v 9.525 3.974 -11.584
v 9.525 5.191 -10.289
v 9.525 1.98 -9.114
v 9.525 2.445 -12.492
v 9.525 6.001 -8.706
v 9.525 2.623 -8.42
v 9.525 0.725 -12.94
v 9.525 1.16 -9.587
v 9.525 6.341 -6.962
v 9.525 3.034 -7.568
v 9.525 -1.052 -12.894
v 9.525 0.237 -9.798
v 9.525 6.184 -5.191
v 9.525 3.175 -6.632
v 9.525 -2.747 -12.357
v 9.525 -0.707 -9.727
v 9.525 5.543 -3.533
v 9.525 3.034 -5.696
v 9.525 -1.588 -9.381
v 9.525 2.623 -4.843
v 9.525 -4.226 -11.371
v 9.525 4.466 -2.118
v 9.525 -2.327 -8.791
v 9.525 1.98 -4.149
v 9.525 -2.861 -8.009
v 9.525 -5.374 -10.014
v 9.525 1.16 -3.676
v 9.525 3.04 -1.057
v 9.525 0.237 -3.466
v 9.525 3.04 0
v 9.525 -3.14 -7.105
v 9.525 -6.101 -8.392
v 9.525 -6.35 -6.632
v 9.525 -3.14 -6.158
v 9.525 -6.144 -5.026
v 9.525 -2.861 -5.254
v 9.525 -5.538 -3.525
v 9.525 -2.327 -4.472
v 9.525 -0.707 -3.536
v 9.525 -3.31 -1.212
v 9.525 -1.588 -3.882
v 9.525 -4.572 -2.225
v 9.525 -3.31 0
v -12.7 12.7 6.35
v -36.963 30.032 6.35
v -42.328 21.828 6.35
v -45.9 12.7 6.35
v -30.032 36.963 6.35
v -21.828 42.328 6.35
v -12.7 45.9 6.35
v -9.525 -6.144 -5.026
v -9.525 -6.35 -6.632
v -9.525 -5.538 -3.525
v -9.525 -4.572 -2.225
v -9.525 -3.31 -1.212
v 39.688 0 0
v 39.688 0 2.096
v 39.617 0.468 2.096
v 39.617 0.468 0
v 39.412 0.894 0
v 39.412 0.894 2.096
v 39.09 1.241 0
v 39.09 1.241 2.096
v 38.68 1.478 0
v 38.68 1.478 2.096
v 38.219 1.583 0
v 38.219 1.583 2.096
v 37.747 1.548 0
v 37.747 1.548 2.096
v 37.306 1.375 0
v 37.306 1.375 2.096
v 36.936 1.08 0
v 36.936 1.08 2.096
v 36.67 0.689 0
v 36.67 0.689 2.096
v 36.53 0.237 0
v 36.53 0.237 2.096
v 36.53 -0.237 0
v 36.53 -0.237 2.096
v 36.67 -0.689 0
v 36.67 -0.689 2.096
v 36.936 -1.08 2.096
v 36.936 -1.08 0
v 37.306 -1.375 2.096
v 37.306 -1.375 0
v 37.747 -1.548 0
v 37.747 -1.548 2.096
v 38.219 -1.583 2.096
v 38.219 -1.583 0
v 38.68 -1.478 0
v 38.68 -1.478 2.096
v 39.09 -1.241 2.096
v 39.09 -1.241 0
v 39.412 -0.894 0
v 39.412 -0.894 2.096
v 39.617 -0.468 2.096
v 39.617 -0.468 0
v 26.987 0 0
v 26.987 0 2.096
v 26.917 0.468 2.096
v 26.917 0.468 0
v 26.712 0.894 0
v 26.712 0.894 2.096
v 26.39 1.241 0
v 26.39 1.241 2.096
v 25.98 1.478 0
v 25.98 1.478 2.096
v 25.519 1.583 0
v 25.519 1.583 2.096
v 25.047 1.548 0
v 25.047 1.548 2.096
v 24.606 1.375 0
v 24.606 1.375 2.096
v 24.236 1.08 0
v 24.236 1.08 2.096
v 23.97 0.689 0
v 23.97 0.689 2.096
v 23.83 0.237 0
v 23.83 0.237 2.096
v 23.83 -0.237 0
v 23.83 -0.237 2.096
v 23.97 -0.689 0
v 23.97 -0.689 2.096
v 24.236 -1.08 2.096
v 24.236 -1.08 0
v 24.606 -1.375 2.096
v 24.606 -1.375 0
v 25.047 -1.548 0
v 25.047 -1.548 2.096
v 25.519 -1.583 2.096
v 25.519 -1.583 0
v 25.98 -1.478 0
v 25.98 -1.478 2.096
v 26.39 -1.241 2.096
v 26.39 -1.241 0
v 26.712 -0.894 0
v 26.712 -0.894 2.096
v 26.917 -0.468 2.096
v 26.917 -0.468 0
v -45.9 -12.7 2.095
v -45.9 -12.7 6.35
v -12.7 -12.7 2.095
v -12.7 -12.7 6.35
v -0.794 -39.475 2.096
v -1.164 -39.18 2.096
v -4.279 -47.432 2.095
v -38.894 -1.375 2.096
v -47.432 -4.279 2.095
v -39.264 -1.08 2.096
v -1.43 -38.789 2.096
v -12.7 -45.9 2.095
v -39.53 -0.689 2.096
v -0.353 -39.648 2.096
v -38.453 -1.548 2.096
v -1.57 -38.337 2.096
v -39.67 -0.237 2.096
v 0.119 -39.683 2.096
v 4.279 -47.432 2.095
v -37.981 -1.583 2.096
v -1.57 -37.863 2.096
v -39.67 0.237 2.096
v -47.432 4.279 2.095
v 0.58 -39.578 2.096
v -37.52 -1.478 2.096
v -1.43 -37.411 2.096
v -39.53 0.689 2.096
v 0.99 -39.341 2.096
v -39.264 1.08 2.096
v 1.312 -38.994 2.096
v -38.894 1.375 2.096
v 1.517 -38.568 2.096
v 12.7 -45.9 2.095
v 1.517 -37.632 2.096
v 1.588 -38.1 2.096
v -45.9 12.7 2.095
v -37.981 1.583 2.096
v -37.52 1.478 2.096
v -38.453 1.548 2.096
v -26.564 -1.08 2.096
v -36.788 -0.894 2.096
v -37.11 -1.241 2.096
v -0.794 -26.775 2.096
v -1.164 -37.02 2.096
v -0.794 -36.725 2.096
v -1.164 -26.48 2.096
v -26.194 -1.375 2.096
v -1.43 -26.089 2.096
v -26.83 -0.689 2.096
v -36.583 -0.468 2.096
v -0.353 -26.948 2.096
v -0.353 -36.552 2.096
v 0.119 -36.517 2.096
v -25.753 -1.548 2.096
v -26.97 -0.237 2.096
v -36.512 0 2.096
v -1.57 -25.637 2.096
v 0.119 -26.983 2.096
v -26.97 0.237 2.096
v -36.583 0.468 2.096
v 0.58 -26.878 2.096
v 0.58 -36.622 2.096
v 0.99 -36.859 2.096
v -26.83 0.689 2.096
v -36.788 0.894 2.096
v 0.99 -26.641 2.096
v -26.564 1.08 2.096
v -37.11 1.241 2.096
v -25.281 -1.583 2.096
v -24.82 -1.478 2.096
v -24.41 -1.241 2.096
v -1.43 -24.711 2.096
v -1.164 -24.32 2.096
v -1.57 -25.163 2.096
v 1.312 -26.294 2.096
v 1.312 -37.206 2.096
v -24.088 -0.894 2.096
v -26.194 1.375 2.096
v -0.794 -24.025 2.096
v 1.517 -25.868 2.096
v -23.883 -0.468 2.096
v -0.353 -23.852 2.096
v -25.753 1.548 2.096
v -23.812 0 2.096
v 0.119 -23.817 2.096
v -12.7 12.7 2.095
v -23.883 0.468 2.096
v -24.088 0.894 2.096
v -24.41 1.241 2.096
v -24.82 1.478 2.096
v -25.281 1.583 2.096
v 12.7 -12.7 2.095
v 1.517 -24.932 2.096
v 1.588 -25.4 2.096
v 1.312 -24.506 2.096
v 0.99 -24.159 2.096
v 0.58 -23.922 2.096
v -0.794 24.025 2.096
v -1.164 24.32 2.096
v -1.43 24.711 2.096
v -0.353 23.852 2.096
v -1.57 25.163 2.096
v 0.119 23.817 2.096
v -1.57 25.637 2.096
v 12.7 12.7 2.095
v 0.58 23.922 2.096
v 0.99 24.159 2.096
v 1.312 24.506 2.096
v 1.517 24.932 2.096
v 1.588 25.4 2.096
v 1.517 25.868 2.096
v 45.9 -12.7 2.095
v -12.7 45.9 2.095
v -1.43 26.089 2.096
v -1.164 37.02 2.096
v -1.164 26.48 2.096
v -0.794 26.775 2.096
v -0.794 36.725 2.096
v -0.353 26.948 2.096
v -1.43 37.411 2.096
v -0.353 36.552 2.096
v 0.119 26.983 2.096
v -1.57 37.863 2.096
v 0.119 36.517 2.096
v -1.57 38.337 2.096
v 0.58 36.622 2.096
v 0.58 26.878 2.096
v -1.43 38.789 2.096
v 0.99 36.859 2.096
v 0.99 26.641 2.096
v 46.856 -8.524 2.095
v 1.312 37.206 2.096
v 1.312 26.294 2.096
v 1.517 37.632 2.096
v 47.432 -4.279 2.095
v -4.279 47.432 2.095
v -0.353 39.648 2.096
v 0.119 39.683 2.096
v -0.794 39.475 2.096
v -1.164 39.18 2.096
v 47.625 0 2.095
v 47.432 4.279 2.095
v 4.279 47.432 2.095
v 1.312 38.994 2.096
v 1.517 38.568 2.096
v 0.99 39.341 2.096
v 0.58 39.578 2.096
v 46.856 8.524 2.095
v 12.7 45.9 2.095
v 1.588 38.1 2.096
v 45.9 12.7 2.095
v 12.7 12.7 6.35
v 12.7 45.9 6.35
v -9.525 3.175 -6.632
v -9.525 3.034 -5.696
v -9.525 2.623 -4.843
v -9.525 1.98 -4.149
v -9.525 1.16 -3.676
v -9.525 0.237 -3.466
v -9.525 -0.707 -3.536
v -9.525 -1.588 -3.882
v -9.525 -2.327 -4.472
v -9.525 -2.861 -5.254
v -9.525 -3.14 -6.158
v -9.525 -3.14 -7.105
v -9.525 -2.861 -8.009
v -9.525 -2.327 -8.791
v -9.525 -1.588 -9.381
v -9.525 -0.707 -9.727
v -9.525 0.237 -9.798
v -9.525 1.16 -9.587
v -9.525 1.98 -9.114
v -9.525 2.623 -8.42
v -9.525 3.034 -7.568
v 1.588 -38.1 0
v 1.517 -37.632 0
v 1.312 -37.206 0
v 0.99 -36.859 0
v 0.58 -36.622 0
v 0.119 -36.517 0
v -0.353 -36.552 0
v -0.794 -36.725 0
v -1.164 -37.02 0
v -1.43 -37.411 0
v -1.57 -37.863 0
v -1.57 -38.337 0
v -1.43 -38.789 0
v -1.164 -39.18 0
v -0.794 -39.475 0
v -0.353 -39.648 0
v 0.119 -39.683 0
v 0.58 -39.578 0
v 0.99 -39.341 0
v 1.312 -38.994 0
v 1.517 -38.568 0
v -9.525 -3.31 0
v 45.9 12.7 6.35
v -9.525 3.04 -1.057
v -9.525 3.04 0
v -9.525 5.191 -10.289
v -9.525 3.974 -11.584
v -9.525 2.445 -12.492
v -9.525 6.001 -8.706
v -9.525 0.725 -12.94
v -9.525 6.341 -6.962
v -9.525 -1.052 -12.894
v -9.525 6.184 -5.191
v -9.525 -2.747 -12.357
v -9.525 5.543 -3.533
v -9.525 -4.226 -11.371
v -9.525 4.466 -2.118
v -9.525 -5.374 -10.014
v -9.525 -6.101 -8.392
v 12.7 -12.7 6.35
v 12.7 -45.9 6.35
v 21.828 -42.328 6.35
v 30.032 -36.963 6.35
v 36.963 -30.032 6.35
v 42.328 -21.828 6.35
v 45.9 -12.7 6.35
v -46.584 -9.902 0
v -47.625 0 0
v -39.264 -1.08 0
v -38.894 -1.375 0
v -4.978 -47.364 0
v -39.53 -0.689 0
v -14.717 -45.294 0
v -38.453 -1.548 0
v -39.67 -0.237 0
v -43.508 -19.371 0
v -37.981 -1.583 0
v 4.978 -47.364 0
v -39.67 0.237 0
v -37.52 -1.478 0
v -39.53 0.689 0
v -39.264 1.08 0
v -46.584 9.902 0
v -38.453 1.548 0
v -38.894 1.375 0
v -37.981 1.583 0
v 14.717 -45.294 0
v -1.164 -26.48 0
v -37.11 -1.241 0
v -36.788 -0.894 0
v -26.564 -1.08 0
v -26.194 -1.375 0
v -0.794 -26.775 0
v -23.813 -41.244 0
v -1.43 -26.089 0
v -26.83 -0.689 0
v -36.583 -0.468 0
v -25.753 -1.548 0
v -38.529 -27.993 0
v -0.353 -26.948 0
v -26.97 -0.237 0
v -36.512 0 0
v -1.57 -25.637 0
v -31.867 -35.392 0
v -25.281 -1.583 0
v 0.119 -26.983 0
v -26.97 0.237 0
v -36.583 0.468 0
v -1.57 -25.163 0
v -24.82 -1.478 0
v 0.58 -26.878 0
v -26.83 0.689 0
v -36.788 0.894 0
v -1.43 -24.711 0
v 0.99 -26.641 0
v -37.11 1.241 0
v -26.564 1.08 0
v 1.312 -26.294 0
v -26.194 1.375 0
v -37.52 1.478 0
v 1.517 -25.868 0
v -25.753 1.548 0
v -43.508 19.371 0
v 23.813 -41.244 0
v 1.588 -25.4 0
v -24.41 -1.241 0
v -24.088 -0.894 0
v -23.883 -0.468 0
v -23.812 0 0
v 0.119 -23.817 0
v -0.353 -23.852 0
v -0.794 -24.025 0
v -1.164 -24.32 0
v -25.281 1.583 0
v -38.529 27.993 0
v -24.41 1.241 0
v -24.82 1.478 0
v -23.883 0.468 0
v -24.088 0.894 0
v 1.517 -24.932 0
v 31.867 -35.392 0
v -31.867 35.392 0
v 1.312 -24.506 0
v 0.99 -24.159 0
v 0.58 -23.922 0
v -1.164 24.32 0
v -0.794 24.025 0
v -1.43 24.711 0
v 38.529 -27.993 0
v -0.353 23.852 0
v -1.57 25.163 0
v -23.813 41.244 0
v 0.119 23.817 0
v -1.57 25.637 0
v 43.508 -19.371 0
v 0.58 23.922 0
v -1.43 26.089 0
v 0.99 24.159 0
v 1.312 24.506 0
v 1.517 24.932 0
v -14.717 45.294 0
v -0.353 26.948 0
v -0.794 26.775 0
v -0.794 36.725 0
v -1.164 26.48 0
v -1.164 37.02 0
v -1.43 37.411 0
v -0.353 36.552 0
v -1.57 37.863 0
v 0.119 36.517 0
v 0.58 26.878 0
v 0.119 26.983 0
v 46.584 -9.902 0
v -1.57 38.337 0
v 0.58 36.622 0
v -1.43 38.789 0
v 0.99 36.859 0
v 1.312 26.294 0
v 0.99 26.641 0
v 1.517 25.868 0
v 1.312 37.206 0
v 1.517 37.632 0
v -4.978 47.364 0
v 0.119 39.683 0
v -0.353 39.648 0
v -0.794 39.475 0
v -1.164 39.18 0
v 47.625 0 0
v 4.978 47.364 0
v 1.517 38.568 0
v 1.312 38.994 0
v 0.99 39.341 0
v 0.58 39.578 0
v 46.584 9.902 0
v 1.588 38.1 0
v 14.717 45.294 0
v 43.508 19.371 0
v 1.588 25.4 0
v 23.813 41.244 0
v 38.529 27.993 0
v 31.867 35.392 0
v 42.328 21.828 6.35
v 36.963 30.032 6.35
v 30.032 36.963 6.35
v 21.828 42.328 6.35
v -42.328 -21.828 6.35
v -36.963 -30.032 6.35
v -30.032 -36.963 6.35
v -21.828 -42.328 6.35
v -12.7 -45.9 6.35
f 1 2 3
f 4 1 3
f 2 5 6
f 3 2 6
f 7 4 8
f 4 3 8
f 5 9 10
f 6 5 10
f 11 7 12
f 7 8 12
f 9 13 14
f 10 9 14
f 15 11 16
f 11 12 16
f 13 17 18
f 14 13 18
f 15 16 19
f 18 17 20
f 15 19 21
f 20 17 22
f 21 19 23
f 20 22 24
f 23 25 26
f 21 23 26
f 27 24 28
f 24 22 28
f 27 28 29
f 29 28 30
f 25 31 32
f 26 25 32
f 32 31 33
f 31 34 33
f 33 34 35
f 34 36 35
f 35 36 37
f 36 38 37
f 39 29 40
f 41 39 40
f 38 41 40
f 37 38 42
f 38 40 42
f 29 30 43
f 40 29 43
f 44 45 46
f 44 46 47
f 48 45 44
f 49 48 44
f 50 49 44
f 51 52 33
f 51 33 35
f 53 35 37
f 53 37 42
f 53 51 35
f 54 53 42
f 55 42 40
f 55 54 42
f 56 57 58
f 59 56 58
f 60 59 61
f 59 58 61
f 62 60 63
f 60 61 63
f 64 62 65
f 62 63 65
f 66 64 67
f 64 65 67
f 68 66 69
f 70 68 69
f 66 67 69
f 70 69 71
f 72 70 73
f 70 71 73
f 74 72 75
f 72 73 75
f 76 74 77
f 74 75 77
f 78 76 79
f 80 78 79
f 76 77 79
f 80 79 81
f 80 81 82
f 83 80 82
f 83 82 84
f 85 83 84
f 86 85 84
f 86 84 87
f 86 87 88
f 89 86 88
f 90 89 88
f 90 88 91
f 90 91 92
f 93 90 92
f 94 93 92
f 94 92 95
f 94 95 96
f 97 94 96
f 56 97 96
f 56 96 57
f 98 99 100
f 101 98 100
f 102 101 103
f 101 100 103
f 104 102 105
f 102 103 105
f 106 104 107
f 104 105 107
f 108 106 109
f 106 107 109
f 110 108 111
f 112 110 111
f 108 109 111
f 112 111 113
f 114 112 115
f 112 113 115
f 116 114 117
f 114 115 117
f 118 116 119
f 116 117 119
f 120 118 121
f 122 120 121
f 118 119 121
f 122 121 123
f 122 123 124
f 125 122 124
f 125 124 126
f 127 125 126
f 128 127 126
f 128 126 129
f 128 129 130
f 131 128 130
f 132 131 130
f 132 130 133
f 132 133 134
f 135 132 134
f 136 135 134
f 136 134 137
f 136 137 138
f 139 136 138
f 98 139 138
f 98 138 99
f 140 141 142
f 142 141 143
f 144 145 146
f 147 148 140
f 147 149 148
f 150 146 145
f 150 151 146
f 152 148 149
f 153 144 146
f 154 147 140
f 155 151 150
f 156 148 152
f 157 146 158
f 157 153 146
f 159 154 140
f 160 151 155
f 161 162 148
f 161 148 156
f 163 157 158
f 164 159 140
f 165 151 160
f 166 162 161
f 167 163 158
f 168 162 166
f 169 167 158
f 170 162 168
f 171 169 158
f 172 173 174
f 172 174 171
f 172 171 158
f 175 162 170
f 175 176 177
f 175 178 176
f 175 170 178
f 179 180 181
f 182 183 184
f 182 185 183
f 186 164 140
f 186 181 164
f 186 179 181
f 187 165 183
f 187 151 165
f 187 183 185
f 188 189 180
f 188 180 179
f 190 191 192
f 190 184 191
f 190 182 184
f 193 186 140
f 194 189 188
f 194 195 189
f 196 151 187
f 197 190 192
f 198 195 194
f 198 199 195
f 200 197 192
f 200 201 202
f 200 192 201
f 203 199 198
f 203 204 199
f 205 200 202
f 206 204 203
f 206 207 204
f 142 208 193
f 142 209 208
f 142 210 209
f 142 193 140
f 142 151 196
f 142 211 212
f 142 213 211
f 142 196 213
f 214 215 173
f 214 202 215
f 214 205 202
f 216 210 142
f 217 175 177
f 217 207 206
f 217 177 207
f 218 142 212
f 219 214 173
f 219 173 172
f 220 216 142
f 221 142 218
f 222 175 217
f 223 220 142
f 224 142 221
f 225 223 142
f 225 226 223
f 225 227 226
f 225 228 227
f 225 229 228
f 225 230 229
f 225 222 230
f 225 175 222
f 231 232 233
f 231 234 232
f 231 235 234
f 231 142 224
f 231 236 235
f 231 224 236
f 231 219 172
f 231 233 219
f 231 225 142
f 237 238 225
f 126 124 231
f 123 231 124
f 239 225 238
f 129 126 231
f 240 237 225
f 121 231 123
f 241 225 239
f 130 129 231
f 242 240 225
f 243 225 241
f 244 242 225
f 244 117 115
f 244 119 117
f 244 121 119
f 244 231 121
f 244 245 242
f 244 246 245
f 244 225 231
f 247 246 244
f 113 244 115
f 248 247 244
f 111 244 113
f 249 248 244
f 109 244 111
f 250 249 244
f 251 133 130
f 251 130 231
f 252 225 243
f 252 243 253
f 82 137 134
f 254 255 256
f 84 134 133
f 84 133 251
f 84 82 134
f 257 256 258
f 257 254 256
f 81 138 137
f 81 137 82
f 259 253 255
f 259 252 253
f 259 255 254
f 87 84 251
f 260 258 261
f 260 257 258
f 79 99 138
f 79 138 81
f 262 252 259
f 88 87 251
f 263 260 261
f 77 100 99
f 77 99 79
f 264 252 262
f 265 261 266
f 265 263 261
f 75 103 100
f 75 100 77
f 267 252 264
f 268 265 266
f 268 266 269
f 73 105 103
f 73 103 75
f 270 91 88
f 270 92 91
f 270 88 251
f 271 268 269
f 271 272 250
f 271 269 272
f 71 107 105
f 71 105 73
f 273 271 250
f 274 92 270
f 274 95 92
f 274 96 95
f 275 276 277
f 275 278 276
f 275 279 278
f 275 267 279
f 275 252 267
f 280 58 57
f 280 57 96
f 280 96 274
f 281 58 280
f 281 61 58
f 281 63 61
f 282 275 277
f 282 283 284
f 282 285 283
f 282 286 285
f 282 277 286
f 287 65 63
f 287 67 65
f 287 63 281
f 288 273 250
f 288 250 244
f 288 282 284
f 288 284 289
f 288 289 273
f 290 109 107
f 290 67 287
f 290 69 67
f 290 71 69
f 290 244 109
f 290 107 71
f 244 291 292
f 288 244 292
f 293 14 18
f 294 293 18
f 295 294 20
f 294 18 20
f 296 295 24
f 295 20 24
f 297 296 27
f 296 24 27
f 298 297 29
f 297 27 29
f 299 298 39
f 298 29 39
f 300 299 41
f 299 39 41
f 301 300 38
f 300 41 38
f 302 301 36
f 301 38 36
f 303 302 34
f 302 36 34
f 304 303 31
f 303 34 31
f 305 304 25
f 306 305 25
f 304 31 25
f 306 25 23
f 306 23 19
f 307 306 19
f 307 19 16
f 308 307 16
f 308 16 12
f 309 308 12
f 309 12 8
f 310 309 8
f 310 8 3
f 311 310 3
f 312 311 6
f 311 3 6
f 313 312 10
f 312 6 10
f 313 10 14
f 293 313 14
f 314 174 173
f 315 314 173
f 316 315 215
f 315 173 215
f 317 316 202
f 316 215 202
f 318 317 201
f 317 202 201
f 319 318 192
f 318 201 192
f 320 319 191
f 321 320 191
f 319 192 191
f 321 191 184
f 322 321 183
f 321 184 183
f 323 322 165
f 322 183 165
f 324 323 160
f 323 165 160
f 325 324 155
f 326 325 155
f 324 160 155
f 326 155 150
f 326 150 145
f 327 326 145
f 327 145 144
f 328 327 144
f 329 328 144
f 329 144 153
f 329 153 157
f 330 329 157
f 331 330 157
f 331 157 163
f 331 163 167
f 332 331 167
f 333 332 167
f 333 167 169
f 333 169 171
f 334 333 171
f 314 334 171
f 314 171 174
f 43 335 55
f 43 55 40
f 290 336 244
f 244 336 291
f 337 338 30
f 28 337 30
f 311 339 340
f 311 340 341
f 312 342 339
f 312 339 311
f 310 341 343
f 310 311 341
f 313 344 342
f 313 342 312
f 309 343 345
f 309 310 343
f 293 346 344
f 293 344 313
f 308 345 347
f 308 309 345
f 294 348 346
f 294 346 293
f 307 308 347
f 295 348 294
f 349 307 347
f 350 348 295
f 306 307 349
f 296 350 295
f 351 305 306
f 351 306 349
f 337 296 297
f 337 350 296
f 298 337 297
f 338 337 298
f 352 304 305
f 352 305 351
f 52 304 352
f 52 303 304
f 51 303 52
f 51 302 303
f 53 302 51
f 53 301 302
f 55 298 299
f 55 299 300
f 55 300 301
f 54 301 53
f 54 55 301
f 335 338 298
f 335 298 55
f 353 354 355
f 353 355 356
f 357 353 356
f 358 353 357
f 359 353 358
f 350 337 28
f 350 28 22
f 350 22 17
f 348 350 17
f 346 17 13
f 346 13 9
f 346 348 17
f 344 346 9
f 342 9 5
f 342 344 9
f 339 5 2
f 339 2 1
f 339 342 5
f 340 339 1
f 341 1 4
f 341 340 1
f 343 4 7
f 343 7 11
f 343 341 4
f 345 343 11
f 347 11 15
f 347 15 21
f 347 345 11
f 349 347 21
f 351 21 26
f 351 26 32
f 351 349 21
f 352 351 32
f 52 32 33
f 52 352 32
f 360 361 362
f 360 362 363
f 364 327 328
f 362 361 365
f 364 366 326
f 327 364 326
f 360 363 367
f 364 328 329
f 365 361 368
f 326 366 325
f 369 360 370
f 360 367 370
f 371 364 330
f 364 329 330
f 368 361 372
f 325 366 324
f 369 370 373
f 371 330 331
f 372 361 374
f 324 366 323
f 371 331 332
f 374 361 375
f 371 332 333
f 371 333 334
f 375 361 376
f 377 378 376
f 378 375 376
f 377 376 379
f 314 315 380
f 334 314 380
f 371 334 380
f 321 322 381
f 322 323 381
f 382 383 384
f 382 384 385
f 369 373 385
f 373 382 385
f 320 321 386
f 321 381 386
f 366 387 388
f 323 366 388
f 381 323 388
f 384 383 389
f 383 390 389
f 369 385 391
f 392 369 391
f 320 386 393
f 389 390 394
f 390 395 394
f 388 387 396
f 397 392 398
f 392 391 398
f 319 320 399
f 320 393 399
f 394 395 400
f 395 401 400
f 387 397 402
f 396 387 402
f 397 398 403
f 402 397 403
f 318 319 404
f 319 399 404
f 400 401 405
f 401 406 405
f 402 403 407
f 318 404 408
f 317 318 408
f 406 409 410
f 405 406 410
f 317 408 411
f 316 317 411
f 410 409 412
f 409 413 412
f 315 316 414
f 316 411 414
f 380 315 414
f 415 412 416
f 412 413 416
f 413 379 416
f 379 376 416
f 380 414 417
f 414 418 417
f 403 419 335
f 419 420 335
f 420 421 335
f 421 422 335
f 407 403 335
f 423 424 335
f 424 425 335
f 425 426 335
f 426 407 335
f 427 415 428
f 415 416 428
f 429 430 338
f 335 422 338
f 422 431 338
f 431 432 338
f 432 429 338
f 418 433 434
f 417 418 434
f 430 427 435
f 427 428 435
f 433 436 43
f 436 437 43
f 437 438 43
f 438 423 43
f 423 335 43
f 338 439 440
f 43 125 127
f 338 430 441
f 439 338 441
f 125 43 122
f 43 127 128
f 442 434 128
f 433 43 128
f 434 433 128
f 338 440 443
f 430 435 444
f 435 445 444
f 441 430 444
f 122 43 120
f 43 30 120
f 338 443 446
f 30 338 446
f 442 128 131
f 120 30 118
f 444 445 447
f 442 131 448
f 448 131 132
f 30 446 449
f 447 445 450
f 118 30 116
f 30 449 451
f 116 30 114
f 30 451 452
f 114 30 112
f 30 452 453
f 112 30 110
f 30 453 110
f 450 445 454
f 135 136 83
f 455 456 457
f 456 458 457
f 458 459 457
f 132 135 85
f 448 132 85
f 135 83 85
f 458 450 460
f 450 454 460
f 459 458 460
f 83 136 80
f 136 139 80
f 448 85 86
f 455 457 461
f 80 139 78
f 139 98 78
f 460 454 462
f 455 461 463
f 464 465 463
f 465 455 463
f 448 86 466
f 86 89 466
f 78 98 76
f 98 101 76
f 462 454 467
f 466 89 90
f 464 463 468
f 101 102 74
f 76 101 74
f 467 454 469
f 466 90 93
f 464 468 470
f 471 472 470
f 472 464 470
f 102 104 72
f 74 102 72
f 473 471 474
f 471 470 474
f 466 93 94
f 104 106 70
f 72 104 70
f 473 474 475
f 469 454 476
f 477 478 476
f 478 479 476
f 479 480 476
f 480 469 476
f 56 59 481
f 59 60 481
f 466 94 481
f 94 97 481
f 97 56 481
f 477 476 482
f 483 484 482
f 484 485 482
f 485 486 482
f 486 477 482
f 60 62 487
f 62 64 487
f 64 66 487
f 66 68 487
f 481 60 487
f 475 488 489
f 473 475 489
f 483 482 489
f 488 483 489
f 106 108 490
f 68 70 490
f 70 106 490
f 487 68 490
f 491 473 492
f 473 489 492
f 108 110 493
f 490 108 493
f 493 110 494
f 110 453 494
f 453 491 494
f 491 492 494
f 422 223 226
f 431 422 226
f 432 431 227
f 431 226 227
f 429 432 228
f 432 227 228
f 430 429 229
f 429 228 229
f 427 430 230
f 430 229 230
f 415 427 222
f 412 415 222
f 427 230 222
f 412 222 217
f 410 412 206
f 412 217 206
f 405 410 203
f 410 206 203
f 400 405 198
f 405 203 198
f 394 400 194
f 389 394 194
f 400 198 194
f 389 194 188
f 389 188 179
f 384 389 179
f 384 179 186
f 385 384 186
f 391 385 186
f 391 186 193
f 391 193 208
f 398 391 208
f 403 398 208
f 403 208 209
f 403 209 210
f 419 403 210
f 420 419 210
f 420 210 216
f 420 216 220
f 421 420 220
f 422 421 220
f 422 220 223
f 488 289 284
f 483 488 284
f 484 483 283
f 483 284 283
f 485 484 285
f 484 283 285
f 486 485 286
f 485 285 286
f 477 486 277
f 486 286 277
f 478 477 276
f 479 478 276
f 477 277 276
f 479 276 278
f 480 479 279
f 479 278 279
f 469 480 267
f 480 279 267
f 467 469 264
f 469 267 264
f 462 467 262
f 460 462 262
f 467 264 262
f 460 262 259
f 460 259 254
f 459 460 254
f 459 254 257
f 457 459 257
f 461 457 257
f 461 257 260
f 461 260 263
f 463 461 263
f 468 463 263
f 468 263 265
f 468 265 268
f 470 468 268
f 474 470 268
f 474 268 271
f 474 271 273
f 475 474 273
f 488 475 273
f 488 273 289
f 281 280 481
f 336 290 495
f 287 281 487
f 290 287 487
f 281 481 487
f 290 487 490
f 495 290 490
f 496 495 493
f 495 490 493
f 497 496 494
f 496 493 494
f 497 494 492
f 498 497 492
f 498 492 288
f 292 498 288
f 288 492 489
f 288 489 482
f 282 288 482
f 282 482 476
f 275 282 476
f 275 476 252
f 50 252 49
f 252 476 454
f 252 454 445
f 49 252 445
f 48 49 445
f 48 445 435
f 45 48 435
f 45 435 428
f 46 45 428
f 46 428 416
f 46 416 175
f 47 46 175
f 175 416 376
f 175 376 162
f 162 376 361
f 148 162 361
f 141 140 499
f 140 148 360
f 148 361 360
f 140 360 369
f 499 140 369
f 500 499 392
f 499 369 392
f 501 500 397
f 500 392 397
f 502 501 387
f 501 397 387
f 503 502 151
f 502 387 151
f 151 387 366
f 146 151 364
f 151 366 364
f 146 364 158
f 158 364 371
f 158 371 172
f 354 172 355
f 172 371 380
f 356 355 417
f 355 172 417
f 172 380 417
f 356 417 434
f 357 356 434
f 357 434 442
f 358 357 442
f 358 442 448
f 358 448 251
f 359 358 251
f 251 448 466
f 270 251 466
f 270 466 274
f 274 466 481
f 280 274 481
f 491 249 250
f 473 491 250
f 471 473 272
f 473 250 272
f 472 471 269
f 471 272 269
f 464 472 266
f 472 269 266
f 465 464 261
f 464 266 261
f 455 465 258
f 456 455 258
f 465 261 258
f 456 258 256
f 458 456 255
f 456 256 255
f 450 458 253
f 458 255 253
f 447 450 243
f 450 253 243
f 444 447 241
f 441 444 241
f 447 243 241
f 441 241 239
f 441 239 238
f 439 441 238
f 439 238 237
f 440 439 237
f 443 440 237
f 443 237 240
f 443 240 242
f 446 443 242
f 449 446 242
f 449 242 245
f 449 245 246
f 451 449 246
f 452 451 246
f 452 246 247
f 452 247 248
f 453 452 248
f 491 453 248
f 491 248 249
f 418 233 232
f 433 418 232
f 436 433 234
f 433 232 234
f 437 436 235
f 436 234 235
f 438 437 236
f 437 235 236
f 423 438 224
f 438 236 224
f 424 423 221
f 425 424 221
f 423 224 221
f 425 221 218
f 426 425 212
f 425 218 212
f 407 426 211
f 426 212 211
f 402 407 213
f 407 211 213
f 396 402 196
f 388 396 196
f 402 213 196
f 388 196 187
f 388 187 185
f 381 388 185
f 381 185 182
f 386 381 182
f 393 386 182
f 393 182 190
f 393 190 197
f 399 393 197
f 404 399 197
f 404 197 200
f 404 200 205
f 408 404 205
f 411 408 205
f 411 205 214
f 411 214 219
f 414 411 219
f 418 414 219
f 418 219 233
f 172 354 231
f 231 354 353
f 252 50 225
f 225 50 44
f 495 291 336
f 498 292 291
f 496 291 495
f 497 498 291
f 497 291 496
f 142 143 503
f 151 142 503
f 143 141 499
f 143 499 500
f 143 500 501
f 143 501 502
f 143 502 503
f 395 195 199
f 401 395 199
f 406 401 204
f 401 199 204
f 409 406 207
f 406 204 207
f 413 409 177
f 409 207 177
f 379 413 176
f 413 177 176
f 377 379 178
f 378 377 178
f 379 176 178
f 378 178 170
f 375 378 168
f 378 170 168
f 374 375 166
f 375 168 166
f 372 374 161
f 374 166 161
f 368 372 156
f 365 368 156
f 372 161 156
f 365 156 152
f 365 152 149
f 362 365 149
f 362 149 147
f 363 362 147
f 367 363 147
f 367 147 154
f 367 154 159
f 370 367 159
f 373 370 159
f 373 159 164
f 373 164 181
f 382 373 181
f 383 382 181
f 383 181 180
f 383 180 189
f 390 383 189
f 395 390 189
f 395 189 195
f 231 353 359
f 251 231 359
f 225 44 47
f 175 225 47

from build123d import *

# Parameters (mm, degrees)
F0_R      = 47.625
F1_DEPTH  = 6.35
F3_DEPTH  = 4.2545
F5_W      = 19.05
F5_H      = 6.35
F6_DEPTH  = 6.35
F8_DEPTH  = 19.05
F9_R      = 3.175
F10_DEPTH = 19.05
F4_R      = 1.5875
F11_DEPTH = 25.4


with BuildPart() as f1:
    # F0 (on Top) → F1 (new body)
    with BuildSketch(Plane.XY):
        Circle(F0_R)
    extrude(amount=F1_DEPTH)

    # F2 (on face) → F3 (cut)
    with BuildSketch(Plane.XY.offset(6.35)):
        with BuildLine():
            ThreePointArc((12.7, 45.900442536), (0, 47.625), (-12.7, 45.900442536))
            Line((-12.7, 45.900442536), (-12.7, 12.7))
            Line((-12.7, 12.7), (-45.900442536, 12.7))
            ThreePointArc((-45.900442536, 12.7), (-47.625, 0), (-45.900442536, -12.7))
            Line((-45.900442536, -12.7), (-12.7, -12.7))
            Line((-12.7, -12.7), (-12.7, -45.900442536))
            ThreePointArc((-12.7, -45.900442536), (0, -47.625), (12.7, -45.900442536))
            Line((12.7, -45.900442536), (12.7, -12.7))
            Line((12.7, -12.7), (45.900442536, -12.7))
            ThreePointArc((45.900442536, -12.7), (47.1918912567, -6.4082778195), (47.625, 0))
            ThreePointArc((47.625, 0), (47.1918912567, 6.4082778195), (45.900442536, 12.7))
            Line((45.900442536, 12.7), (12.7, 12.7))
            Line((12.7, 12.7), (12.7, 45.900442536))
        make_face()
    extrude(amount=-F3_DEPTH, mode=Mode.SUBTRACT)

    # F5 (on face) → F6 (join)
    with BuildSketch(Plane(origin=(0, 0, 0), x_dir=(1, 0, 0), z_dir=(0, 0, -1))):
        with Locations((0, 0.1347091747)):
            Rectangle(F5_W, F5_H)
    extrude(amount=F6_DEPTH)

    # F7 (on face) → F8 (join)
    with BuildSketch(Plane(origin=(-9.525, 0, 0), x_dir=(0, -1, 0), z_dir=(-1, 0, 0))):
        with BuildLine():
            ThreePointArc((-3.0402908253, -1.0568323894), (-3.2416549215, -12.0919341109), (6.35, -6.6316984594))
            ThreePointArc((6.35, -6.6316984594), (5.5380119745, -3.5247830485), (3.3097091747, -1.2124434203))
            Line((3.3097091747, -1.2124434203), (3.3097091747, -6.35))
            Line((3.3097091747, -6.35), (-3.0402908253, -6.35))
            Line((-3.0402908253, -6.35), (-3.0402908253, -1.0568323894))
        make_face()
    extrude(amount=-F8_DEPTH)

    # F9 (on face) → F10 (cut)
    with BuildSketch(Plane.YZ.offset(9.525)):
        with Locations((0, -6.6316984594)):
            Circle(F9_R)
    extrude(amount=-F10_DEPTH, mode=Mode.SUBTRACT)

    # F4 (on face) → F11 (cut)
    with BuildSketch(Plane.XY.offset(2.0955)):
        with Locations((-38.1, 0)):
            Circle(F4_R)
        with Locations((-25.4, 0)):
            Circle(F4_R)
        with Locations((0, -25.4)):
            Circle(F4_R)
        with Locations((0, -38.1)):
            Circle(F4_R)
        with Locations((25.4, 0)):
            Circle(F4_R)
        with Locations((38.1, 0)):
            Circle(F4_R)
        with Locations((0, 25.4)):
            Circle(F4_R)
        with Locations((0, 38.1)):
            Circle(F4_R)
    extrude(amount=-F11_DEPTH, mode=Mode.SUBTRACT)


solid = f1.part
